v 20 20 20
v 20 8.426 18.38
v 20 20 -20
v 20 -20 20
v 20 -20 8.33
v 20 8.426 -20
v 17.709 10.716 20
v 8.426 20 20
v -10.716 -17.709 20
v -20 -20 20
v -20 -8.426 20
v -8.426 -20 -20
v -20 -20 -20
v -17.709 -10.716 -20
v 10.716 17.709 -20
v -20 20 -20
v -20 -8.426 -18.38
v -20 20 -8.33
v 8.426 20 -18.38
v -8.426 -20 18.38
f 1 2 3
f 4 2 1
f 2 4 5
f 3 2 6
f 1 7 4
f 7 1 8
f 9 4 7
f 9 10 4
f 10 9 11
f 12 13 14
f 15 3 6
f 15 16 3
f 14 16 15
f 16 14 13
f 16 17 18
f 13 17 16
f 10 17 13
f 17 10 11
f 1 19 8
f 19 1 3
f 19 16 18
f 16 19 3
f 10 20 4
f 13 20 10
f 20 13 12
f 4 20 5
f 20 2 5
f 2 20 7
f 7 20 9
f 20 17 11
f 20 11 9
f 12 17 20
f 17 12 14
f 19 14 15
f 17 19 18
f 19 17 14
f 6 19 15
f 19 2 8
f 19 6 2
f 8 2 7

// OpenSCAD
// Prince Rupert demo: same-size cube passes through another
s = 40;          // cube edge (mm)
eps = 0.1;       // tiny oversize so the hole is clean
theta = atan(1/2); // ≈ 26.565051°  (the classic Rupert tilt)

difference() {
  // Outer cube, centered
  cube([s,s,s], center=true);

  // Subtractive cube: same size, slightly oversize
  // Rotate Z by 45°, then X by theta
  // (OpenSCAD apply order is X then Y then Z for rotate([x,y,z]),
  // so use two rotates to control order.)
  rotate([0,0,45])
    rotate([theta,0,0])
      #cube([s+2*eps, 2*s+2*eps, s+2*eps], center=true);
}
